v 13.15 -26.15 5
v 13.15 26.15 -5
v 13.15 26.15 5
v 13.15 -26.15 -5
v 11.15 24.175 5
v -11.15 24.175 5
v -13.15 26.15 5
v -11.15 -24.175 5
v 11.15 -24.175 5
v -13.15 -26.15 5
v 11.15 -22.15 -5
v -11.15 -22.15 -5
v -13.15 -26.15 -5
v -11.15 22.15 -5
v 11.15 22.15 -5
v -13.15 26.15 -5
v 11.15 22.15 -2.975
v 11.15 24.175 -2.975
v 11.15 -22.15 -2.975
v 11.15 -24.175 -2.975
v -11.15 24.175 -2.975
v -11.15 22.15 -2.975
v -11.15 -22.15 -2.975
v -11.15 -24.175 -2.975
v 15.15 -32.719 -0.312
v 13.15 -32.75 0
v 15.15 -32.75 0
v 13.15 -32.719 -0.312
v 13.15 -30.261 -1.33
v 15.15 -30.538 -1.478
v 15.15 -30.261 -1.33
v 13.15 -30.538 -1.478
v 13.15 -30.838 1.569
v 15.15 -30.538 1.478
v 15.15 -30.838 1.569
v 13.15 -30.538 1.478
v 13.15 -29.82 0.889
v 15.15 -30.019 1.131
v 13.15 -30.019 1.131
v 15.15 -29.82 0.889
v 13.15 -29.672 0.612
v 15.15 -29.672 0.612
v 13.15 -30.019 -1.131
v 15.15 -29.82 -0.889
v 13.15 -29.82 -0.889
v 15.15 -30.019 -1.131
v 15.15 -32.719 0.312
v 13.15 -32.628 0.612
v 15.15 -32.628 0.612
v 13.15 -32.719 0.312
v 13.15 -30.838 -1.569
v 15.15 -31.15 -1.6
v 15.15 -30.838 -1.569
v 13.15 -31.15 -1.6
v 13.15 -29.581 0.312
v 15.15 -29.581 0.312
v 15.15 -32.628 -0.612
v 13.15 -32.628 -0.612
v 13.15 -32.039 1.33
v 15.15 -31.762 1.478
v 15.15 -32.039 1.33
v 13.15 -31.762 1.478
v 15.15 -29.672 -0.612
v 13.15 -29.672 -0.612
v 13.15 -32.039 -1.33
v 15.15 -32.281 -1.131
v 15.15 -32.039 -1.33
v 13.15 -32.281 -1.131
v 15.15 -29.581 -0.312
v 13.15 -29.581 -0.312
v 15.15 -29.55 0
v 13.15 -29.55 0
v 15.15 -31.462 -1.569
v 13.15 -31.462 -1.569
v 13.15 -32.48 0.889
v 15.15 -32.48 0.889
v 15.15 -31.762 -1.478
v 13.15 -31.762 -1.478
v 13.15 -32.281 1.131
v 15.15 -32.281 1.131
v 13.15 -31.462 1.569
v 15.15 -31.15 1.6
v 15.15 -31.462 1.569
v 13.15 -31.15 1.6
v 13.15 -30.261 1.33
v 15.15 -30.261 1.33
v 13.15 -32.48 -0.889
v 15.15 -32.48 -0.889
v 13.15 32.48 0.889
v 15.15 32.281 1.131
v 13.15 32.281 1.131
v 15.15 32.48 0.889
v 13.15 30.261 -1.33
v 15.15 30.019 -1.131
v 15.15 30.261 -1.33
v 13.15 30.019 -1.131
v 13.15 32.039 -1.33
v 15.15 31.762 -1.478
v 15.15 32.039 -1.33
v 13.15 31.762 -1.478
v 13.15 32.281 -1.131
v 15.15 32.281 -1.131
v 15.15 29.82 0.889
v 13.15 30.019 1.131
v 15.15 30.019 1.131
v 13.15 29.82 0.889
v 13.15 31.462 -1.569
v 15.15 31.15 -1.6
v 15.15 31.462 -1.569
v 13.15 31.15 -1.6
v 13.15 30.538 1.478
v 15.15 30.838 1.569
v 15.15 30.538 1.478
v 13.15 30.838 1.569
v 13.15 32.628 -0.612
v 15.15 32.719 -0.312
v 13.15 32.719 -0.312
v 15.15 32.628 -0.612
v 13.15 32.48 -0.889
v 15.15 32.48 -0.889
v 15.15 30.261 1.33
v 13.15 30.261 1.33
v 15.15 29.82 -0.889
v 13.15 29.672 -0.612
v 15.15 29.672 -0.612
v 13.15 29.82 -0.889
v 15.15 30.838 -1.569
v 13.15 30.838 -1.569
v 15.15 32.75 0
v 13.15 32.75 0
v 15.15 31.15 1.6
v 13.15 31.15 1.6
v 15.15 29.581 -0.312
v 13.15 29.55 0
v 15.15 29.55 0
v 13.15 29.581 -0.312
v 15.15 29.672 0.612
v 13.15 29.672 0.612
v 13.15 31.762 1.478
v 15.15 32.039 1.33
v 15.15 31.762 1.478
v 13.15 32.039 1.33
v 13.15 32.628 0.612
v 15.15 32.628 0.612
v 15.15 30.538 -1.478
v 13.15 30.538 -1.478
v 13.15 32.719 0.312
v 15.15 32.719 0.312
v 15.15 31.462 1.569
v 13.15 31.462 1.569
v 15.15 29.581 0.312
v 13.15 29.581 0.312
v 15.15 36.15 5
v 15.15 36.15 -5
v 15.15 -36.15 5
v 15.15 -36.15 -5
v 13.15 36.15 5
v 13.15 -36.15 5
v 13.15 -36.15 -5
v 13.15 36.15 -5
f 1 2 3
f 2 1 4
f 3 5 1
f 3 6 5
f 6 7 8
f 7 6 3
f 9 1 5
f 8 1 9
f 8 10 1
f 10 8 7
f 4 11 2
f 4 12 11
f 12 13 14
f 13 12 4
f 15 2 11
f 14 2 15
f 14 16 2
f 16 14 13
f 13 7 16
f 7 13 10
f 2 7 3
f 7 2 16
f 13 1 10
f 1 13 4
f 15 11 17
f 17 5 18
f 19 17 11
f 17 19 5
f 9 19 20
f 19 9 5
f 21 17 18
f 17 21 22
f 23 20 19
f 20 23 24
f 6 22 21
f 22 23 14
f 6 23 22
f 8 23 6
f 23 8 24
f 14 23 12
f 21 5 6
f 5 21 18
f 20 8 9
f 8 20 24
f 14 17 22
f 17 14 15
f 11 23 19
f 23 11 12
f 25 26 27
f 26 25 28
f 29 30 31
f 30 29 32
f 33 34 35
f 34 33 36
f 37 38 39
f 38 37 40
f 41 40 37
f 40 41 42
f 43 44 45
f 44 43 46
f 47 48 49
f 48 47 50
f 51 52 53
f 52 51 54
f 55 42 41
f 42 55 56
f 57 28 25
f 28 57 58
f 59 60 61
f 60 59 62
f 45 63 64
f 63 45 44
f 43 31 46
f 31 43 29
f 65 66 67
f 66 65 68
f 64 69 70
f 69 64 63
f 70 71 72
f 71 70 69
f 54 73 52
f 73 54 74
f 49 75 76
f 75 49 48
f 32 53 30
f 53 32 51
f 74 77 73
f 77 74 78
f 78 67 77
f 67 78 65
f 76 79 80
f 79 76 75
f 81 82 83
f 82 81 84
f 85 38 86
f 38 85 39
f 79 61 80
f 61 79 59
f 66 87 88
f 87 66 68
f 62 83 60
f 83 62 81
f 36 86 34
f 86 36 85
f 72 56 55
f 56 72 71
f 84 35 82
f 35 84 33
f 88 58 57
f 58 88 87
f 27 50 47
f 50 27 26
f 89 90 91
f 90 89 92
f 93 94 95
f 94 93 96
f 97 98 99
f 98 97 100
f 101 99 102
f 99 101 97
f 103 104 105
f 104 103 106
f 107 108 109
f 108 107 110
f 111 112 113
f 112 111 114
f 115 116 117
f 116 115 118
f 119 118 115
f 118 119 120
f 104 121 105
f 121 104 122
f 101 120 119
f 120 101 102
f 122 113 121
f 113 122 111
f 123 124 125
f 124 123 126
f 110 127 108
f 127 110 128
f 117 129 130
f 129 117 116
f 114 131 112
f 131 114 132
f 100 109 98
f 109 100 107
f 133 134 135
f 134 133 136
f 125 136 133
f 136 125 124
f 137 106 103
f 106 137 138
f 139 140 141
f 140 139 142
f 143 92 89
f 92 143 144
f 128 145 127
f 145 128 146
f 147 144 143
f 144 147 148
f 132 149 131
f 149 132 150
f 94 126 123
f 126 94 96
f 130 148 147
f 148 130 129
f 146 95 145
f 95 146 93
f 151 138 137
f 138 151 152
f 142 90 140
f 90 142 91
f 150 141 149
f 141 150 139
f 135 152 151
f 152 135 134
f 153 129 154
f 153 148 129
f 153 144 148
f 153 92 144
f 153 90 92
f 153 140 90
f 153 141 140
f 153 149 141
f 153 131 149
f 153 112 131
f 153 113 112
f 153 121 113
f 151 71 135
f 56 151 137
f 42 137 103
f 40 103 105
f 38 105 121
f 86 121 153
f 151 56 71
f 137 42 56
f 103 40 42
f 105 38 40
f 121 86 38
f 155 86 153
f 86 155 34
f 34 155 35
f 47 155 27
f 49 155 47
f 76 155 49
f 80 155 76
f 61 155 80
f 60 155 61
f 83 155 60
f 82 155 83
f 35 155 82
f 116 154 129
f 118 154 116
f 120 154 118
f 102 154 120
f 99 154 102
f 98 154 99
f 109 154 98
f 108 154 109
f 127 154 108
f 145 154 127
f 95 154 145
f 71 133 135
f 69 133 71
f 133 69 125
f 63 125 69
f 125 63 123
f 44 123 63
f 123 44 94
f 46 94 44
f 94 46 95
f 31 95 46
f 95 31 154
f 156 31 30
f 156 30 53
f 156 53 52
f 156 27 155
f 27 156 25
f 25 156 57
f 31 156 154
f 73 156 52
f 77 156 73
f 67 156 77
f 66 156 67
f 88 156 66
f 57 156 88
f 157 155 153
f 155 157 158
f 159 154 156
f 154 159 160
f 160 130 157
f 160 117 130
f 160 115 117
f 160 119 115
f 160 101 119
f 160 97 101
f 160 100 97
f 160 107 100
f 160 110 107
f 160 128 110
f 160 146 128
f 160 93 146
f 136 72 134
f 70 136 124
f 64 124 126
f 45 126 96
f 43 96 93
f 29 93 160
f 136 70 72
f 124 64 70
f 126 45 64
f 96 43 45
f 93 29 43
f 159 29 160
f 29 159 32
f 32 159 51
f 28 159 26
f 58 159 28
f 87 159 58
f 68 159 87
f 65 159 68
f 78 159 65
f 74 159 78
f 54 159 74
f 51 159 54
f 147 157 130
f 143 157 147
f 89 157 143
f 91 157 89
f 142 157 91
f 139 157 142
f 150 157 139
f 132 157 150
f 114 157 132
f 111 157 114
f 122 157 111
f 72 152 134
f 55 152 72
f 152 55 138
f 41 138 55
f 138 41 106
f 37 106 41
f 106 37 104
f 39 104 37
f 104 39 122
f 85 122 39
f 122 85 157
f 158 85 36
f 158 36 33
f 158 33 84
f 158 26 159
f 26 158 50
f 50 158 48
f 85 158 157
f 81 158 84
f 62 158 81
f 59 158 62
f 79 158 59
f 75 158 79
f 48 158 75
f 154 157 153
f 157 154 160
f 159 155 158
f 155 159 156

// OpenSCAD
cutting_epsilon = 0.05;

module hella4570_holder_frame(inner_width, inner_height, height, thickness) {
	difference() {
		cube([inner_width + 2*thickness,
			inner_height + 4*thickness,
			height], center = true);
		translate([0, 0, thickness/2 + cutting_epsilon/2])
			cube([inner_width, inner_height + 2*thickness + cutting_epsilon,
				height - thickness],
				center = true);
		cube([inner_width, inner_height, height + cutting_epsilon],
			center = true);
	}
}

module hella4570_holder_mount(width, inner_height, thickness, hole_diameter) {
	difference() {
		height = inner_height + 4*thickness + 2*width;
		cube([thickness, height, width],
			center = true);
		for (f = [-1:2:1])
			translate([0, f * (height/2 - width/2), 0])
			rotate([0, 90, 0])
				cylinder(d = hole_diameter, h = thickness + cutting_epsilon,
					center = true,
					$fn = 32);
	}
}

module hella4570_holder(inner_width = 22.1,
	inner_height = 44.1,
	height = 10,
	thickness = 2,
	mount_hole_diameter = 3,
	epsilon = 0.1) {
	ciw = inner_width + 2*epsilon;
	cih = inner_height + 2*epsilon;
	cmhd = mount_hole_diameter + 2*epsilon;

	union() {
		hella4570_holder_frame(inner_width = ciw,
			inner_height = cih,
			height = height,
			thickness = thickness);

		translate([ciw/2 + 1.5*thickness, 0, 0])
			hella4570_holder_mount(width = height,
				inner_height = cih,
				thickness = thickness,
				hole_diameter = cmhd);
	}
}

hella4570_holder();
